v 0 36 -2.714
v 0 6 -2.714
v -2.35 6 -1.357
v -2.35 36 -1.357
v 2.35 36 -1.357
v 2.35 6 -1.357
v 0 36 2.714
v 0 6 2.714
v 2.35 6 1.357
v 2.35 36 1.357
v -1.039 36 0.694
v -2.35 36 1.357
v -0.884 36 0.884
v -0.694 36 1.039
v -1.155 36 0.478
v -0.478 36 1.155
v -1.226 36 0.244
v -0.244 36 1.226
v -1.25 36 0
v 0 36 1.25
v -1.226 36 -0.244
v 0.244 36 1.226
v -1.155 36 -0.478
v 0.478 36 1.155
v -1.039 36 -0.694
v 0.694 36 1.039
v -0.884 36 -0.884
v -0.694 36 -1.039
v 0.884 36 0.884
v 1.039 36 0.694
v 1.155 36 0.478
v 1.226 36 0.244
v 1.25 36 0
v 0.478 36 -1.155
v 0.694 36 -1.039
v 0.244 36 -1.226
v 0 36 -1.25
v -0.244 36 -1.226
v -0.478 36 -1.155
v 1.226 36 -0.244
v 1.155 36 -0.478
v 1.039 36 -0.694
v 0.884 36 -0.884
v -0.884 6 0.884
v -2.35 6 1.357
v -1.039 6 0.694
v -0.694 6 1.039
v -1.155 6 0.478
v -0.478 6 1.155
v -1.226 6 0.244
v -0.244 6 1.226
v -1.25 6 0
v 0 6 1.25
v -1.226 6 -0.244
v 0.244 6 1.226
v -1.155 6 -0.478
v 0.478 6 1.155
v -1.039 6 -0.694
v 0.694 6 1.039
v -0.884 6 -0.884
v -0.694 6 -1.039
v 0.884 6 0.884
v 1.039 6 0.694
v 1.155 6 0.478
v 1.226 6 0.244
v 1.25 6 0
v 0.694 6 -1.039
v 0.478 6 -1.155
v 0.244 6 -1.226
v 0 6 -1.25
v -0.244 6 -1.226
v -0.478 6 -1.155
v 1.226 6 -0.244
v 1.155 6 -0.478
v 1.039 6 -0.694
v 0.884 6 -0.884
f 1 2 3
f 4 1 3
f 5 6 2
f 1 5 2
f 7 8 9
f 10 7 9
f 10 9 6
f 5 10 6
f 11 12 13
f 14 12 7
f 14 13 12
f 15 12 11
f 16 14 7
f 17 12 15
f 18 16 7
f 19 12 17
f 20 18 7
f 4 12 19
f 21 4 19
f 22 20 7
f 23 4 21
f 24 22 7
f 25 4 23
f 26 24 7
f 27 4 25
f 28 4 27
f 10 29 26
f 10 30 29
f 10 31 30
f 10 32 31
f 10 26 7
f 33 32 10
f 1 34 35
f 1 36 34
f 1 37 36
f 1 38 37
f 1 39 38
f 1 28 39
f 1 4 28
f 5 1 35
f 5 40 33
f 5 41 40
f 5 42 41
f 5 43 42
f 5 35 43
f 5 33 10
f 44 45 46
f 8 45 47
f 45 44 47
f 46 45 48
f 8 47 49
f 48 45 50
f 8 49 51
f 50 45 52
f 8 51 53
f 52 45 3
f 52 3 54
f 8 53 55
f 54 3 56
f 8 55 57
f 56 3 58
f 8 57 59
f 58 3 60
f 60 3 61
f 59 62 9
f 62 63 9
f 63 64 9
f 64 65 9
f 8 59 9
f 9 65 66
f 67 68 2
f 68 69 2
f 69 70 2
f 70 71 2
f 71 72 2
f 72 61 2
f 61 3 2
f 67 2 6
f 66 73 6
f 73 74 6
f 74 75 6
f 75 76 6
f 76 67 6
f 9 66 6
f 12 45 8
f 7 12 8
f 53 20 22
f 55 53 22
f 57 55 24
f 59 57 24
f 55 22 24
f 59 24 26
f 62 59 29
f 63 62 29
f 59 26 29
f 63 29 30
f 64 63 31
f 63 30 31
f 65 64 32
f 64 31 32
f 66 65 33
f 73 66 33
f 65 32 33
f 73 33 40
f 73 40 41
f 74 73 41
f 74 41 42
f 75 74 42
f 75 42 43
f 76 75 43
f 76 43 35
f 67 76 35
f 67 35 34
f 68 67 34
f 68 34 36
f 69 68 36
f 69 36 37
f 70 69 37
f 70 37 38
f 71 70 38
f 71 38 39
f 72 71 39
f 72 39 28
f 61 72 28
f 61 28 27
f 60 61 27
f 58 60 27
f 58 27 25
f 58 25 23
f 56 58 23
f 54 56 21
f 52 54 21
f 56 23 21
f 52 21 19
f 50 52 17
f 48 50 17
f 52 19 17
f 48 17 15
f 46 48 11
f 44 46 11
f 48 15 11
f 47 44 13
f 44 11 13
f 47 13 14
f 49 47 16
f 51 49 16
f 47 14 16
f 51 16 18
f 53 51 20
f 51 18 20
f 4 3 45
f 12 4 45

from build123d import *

# Parameters (mm, degrees)
SKETCH1_R           = 1.5
BOSS_EXTRUDE1_DEPTH = 6
BOSS_EXTRUDE2_DEPTH = 30
SKETCH3_R           = 1.25
CUT_EXTRUDE1_DEPTH  = 37.178527241
SKETCH4_R           = 1.753983447
CUT_EXTRUDE2_DEPTH  = 10


with BuildPart() as part:
    # Sketch1 → Boss-Extrude1 (new body)
    with BuildSketch(Plane(origin=(0, 0, 0), x_dir=(1, 0, 0), z_dir=(0, 1, 0))):
        Circle(SKETCH1_R)
    extrude(amount=BOSS_EXTRUDE1_DEPTH)

    # Sketch2 → Boss-Extrude2 (add)
    with BuildSketch(Plane(origin=(0, 6, 0), x_dir=(1, 0, 0), z_dir=(0, 1, 0))):
        Polygon((-2.35, 1.356773133), (-2.35, -1.356773133), (0, -2.713546265), (2.35, -1.356773133), (2.35, 1.356773133), (0, 2.713546265), align=None)
    extrude(amount=BOSS_EXTRUDE2_DEPTH)

    # Sketch3 → Cut-Extrude1 (cut, through all)
    with BuildSketch(Plane(origin=(0, 36, 0), x_dir=(1, 0, 0), z_dir=(0, 1, 0))):
        Circle(SKETCH3_R)
    extrude(amount=-CUT_EXTRUDE1_DEPTH, mode=Mode.SUBTRACT)

    # Sketch4 → Cut-Extrude2 (cut)
    with BuildSketch(Plane.XZ.offset(-6)):
        Circle(SKETCH4_R)
    extrude(amount=CUT_EXTRUDE2_DEPTH, mode=Mode.SUBTRACT)


solid = part.part
